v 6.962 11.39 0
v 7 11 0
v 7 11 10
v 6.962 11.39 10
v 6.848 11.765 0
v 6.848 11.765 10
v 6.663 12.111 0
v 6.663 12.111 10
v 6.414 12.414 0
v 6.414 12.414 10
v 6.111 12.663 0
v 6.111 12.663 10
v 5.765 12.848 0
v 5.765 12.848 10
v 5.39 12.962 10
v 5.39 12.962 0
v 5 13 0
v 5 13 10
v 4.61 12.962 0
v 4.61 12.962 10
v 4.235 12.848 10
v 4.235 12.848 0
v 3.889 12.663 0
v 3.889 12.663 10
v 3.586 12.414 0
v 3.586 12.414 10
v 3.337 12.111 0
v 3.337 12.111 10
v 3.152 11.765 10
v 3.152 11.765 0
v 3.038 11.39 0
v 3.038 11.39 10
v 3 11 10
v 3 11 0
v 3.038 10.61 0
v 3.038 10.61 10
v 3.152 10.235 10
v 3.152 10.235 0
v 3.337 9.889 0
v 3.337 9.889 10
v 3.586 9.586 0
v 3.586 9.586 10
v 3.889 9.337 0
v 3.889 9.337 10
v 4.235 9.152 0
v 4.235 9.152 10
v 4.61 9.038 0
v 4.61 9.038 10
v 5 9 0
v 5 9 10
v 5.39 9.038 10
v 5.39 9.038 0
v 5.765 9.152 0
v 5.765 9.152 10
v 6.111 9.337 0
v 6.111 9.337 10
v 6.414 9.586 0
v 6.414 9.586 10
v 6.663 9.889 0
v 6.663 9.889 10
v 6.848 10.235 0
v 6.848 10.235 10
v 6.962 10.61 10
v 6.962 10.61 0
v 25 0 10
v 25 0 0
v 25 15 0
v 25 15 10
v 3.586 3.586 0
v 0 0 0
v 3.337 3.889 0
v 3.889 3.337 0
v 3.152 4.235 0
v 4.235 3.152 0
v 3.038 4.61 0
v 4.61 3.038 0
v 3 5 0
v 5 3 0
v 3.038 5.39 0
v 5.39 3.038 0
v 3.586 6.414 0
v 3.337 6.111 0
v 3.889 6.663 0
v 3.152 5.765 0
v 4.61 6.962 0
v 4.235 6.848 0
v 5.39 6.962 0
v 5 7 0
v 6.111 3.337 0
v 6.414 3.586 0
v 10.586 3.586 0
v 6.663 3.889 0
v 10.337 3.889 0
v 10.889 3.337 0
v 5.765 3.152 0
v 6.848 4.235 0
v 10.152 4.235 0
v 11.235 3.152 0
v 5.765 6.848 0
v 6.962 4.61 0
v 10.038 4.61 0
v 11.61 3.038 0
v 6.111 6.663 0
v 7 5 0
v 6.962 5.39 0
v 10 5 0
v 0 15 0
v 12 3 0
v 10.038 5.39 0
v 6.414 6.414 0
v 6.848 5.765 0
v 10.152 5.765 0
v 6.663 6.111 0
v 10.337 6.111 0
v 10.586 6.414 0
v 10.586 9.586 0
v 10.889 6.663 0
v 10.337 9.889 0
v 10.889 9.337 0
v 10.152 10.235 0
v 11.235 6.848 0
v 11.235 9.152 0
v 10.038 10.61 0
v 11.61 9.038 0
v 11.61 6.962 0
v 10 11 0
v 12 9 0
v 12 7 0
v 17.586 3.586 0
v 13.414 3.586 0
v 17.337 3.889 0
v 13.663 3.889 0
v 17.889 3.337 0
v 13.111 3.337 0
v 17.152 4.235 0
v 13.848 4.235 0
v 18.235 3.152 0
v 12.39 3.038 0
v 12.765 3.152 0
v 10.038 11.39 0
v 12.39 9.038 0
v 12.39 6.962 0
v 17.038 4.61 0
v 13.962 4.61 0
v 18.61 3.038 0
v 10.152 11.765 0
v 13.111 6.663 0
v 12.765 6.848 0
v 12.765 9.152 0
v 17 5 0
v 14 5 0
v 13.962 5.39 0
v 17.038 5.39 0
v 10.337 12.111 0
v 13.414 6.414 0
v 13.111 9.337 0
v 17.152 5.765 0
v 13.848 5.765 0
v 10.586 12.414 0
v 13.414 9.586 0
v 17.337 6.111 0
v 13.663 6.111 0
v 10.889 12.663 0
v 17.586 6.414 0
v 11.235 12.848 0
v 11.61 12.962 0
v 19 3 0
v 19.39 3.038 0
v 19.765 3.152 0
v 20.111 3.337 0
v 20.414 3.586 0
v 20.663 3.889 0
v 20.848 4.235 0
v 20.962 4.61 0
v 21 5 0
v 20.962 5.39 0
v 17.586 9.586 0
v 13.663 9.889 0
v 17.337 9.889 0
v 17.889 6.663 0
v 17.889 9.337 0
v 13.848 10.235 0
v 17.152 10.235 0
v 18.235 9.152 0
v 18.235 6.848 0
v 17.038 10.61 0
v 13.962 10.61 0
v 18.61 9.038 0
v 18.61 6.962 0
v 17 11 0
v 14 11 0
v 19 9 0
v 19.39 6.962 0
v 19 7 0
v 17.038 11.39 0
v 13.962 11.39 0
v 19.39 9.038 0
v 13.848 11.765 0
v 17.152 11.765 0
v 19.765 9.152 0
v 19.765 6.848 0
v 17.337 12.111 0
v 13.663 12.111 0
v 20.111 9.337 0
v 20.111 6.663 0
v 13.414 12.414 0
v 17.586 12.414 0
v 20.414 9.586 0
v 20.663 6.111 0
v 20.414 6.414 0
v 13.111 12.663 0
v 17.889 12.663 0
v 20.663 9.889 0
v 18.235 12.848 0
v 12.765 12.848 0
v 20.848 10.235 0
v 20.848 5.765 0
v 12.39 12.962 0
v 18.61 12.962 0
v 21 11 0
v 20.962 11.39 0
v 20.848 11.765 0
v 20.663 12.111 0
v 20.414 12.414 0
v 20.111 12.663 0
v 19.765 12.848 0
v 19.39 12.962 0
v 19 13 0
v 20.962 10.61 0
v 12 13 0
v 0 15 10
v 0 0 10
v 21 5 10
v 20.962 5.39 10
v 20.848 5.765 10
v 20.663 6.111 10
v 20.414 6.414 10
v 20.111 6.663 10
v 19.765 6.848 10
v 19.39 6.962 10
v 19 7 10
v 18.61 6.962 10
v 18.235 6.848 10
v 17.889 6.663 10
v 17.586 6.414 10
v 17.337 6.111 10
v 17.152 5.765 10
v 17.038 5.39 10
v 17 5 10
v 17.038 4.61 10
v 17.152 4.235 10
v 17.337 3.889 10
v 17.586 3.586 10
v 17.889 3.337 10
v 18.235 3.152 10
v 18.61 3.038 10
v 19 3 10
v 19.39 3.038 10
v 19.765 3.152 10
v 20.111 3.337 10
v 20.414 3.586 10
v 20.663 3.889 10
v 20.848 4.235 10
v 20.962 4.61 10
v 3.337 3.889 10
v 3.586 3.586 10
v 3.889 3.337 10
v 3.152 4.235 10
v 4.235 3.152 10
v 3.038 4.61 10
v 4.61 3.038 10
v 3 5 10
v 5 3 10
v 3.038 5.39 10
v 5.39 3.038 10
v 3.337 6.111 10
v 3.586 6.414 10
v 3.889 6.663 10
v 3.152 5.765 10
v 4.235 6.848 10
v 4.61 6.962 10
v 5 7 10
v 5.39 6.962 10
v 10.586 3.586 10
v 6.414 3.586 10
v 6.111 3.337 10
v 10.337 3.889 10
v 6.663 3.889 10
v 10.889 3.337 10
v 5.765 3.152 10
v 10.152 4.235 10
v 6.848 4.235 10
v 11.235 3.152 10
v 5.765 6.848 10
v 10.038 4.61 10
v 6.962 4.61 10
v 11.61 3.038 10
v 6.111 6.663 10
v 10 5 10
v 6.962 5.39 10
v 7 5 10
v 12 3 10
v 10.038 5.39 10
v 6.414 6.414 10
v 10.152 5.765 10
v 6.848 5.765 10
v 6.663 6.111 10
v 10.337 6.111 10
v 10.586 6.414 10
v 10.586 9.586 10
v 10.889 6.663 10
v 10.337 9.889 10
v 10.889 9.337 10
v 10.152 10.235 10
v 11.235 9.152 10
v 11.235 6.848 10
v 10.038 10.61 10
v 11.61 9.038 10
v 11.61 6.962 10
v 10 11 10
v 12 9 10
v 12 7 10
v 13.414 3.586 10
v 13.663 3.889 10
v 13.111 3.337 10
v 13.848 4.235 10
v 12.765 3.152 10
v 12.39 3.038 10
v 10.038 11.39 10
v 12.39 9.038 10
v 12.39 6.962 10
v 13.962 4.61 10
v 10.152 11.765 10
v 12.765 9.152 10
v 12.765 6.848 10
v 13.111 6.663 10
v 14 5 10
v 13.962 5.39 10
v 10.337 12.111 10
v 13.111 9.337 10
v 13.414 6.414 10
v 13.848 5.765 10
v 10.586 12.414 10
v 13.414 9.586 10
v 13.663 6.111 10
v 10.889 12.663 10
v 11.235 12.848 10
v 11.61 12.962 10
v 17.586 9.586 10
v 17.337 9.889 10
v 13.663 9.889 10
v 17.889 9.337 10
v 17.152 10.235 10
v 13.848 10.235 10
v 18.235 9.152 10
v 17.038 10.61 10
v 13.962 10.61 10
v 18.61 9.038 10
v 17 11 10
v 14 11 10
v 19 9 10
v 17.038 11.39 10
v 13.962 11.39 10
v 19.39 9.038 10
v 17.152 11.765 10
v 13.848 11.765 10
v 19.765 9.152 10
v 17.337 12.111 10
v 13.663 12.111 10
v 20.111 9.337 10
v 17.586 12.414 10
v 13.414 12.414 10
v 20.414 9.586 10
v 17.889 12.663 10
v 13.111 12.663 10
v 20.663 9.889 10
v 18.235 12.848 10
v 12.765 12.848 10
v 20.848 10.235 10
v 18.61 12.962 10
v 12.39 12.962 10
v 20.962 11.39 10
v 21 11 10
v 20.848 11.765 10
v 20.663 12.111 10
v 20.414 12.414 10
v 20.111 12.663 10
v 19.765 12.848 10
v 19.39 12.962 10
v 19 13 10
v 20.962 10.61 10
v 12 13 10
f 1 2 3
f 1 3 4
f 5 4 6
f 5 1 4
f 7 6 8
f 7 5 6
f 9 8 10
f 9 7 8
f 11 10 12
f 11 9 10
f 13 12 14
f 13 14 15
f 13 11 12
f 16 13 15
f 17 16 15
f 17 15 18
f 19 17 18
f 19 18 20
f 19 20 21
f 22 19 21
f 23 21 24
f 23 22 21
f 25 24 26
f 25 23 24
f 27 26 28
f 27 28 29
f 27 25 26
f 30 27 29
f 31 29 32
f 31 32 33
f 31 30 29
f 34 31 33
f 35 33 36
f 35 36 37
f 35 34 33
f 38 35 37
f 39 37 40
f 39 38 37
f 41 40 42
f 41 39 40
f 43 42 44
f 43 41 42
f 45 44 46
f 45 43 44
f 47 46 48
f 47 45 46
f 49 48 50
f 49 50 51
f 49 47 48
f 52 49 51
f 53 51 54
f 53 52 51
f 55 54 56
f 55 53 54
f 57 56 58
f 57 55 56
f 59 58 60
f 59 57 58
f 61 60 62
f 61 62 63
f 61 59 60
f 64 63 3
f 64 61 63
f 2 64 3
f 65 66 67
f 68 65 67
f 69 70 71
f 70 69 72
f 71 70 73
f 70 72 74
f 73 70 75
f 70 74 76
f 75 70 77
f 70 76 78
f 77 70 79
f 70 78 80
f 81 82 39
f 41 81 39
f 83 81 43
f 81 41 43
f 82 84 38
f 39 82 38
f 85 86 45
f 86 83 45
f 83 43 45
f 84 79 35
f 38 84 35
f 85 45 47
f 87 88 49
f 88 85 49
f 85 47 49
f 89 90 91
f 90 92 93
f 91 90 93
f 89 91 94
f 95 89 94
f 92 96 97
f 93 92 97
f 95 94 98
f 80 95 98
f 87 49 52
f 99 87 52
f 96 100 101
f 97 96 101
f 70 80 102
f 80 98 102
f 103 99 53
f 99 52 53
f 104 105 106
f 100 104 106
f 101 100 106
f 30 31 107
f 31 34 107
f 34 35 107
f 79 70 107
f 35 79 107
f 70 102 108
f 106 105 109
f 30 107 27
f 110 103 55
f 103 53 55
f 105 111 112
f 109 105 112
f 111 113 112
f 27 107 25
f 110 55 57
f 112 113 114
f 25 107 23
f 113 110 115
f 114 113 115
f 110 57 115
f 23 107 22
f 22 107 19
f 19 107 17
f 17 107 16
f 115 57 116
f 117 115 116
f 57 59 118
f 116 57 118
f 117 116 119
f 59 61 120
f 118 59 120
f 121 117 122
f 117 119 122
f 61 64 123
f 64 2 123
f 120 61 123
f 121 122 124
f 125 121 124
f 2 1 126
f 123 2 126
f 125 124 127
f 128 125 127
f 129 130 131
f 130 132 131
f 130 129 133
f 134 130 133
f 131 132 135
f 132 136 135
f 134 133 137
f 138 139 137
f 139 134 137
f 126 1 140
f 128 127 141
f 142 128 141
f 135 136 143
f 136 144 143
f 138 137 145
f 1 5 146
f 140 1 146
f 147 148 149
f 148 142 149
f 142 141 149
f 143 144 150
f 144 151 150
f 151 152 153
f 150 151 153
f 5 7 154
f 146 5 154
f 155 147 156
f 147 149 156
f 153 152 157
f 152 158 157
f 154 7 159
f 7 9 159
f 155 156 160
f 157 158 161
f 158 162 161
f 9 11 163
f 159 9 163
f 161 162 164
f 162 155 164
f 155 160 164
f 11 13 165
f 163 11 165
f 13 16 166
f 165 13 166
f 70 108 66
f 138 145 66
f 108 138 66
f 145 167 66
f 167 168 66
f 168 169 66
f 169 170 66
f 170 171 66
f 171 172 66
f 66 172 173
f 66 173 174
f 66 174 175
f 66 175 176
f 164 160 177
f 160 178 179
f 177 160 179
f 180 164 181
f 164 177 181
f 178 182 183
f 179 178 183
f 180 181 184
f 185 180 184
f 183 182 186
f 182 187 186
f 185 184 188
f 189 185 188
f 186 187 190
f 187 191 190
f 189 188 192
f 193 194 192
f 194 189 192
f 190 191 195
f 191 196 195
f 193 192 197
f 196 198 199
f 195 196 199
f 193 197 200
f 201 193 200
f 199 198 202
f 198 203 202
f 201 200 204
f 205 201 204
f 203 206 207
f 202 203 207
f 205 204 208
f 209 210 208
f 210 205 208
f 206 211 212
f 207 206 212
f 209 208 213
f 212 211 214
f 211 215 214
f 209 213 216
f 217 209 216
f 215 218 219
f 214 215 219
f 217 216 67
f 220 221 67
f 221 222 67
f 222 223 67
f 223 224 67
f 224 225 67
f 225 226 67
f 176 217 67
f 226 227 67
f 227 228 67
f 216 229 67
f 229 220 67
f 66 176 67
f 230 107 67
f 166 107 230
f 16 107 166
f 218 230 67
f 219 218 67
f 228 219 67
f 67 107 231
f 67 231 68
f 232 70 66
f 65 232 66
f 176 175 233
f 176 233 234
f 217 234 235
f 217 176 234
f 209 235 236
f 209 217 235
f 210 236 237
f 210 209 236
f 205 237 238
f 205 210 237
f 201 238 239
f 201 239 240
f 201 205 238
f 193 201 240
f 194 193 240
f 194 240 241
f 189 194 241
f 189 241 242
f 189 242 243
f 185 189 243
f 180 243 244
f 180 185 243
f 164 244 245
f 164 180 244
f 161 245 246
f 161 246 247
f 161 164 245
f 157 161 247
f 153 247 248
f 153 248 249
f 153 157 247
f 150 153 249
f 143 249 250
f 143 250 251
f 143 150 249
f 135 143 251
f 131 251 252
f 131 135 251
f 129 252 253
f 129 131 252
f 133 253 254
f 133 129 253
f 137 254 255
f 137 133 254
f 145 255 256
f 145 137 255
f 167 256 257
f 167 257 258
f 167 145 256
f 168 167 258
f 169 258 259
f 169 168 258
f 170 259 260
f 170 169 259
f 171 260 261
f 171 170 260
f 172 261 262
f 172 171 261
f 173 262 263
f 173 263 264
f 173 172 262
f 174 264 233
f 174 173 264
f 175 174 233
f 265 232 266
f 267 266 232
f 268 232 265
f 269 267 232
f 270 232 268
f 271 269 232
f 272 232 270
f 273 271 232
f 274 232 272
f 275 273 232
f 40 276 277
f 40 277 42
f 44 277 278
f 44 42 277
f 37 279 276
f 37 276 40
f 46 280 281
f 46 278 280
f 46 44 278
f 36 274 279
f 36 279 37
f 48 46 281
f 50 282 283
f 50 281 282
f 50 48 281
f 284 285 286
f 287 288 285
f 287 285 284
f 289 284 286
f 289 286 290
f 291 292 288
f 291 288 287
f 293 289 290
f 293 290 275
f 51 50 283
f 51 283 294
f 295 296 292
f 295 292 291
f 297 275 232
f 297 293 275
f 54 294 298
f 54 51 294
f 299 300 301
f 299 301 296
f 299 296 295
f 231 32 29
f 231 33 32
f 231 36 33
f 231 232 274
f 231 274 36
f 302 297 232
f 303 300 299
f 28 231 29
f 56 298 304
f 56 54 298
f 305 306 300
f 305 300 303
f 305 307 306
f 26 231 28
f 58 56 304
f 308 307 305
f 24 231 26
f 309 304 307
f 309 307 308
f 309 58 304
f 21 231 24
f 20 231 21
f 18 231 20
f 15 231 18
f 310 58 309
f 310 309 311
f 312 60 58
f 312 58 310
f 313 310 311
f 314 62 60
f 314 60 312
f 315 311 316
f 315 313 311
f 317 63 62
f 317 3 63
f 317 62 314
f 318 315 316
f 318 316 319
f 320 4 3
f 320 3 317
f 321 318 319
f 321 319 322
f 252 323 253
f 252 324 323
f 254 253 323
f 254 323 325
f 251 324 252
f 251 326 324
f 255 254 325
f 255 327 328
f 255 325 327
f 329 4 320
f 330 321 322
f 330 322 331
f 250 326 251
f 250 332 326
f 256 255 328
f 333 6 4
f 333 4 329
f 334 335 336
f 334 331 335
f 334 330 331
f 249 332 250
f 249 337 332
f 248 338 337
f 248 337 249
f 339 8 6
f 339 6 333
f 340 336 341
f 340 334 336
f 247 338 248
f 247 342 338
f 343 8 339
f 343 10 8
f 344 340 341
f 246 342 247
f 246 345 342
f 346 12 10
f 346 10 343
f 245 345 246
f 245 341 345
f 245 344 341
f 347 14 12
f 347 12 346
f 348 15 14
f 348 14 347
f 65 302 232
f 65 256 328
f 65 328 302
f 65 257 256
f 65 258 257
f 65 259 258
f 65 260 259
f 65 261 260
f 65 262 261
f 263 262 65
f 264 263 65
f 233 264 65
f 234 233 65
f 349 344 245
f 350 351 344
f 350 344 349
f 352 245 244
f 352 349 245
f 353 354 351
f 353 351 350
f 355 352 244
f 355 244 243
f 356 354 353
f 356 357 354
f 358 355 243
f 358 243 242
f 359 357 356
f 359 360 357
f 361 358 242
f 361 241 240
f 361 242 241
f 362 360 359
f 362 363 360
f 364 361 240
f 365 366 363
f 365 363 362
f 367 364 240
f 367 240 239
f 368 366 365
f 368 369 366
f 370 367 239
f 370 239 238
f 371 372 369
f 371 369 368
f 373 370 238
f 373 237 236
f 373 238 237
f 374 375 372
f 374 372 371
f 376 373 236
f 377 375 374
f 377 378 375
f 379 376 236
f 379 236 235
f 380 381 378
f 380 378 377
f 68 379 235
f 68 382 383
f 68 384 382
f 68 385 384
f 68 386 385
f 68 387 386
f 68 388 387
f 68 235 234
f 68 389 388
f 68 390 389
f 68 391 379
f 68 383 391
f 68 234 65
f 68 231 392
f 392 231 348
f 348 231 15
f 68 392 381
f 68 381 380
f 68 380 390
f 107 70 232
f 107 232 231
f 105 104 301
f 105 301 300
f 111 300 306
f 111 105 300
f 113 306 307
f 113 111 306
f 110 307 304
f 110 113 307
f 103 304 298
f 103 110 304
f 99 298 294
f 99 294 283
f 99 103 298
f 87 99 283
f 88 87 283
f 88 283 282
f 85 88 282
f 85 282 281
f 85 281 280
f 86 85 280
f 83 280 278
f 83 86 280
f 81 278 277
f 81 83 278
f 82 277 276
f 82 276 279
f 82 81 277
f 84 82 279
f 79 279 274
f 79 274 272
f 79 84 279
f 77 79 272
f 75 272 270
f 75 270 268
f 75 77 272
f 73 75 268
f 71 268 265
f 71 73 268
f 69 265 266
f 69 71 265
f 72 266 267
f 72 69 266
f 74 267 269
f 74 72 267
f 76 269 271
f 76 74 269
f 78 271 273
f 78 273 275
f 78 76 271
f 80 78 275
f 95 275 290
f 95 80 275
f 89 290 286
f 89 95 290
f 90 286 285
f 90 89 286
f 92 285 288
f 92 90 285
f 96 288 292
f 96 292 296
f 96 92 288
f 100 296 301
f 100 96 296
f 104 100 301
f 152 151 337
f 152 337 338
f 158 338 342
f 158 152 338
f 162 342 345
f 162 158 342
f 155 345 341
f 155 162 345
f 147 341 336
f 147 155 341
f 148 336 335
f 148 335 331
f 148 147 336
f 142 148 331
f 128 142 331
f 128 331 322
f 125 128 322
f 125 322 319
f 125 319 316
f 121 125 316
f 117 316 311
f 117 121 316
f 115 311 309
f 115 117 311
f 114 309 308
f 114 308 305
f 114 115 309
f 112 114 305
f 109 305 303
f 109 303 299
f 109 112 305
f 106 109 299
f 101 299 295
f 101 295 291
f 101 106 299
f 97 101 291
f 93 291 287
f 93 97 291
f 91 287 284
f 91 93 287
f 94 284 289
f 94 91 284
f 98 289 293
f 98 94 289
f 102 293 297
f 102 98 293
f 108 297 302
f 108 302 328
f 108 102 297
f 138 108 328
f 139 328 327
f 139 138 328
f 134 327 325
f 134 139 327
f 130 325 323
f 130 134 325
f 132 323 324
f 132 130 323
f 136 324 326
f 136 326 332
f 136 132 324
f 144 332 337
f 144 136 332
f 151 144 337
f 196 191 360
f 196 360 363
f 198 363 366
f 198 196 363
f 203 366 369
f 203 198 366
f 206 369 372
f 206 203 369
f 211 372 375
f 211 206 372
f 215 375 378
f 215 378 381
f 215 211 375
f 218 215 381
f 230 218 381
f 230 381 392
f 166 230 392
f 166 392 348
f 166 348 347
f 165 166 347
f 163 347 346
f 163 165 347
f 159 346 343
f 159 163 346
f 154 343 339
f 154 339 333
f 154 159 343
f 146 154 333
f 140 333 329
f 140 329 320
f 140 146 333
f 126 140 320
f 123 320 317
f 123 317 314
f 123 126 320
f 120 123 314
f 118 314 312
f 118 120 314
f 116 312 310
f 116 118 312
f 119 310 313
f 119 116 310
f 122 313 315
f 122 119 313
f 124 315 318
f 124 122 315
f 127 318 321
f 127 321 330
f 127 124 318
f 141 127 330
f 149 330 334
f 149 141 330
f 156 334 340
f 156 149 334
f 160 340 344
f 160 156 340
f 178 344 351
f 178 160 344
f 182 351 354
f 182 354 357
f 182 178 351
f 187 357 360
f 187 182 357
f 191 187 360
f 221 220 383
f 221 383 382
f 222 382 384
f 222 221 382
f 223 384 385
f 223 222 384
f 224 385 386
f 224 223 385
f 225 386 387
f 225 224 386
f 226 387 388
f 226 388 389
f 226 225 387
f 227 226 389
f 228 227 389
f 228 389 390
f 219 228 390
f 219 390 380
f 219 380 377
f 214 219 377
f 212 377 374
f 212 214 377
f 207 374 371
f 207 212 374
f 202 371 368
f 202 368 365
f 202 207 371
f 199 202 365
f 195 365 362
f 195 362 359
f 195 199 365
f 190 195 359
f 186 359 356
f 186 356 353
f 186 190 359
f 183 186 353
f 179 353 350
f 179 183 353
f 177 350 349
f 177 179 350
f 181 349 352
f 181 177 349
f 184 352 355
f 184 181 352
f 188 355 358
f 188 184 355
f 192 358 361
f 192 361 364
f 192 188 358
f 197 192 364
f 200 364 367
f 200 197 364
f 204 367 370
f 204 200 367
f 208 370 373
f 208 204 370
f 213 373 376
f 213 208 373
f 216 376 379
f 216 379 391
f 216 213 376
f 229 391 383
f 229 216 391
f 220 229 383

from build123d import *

# Parameters (mm, degrees)
CYLINDER005_R     = 2
CYLINDER005_DEPTH = 10
CYLINDER004_R     = 2
CYLINDER004_DEPTH = 10
CYLINDER002_R     = 2
CYLINDER002_DEPTH = 10
CYLINDER003_R     = 2
CYLINDER003_DEPTH = 10
CYLINDER_R        = 2
CYLINDER_DEPTH    = 10
CYLINDER001_R     = 2
CYLINDER001_DEPTH = 10
BOX_W             = 25
BOX_H             = 15
BOX_DEPTH         = 10


with BuildPart() as cilindro005:
    # Cylinder005 → Cylinder005 (new body)
    with BuildSketch(Plane(origin=(19, 11, 0), x_dir=(1, 0, 0), z_dir=(0, 0, 1))):
        Circle(CYLINDER005_R)
    extrude(amount=CYLINDER005_DEPTH)


with BuildPart() as fusion:
    # Cylinder004 → Cylinder004 (new body)
    with BuildSketch(Plane(origin=(12, 11, 0), x_dir=(1, 0, 0), z_dir=(0, 0, 1))):
        Circle(CYLINDER004_R)
    extrude(amount=CYLINDER004_DEPTH)

    # Fusion: union Cilindro005
    add(cilindro005.part)


with BuildPart() as cilindro002:
    # Cylinder002 → Cylinder002 (new body)
    with BuildSketch(Plane(origin=(19, 5, 0), x_dir=(1, 0, 0), z_dir=(0, 0, 1))):
        Circle(CYLINDER002_R)
    extrude(amount=CYLINDER002_DEPTH)


with BuildPart() as fusion001:
    # Cylinder003 → Cylinder003 (new body)
    with BuildSketch(Plane(origin=(5, 11, 0), x_dir=(1, 0, 0), z_dir=(0, 0, 1))):
        Circle(CYLINDER003_R)
    extrude(amount=CYLINDER003_DEPTH)

    # Fusion001: union Cilindro002
    add(cilindro002.part)


with BuildPart() as cilindro:
    # Cylinder → Cylinder (new body)
    with BuildSketch(Plane(origin=(5, 5, 0), x_dir=(1, 0, 0), z_dir=(0, 0, 1))):
        Circle(CYLINDER_R)
    extrude(amount=CYLINDER_DEPTH)


with BuildPart() as agujeros:
    # Cylinder001 → Cylinder001 (new body)
    with BuildSketch(Plane(origin=(12, 5, 0), x_dir=(1, 0, 0), z_dir=(0, 0, 1))):
        Circle(CYLINDER001_R)
    extrude(amount=CYLINDER001_DEPTH)

    # Fusion002: union Cilindro
    add(cilindro.part)

    # Fusion003: union Fusion, Fusion001
    add(fusion.part)
    add(fusion001.part)


with BuildPart() as ladrillo:
    # Box → Box (new body)
    with BuildSketch(Plane.XY):
        with Locations((12.5, 7.5)):
            Rectangle(BOX_W, BOX_H)
    extrude(amount=BOX_DEPTH)

    # Cut: cut agujeros
    add(agujeros.part, mode=Mode.SUBTRACT)


solid = ladrillo.part
